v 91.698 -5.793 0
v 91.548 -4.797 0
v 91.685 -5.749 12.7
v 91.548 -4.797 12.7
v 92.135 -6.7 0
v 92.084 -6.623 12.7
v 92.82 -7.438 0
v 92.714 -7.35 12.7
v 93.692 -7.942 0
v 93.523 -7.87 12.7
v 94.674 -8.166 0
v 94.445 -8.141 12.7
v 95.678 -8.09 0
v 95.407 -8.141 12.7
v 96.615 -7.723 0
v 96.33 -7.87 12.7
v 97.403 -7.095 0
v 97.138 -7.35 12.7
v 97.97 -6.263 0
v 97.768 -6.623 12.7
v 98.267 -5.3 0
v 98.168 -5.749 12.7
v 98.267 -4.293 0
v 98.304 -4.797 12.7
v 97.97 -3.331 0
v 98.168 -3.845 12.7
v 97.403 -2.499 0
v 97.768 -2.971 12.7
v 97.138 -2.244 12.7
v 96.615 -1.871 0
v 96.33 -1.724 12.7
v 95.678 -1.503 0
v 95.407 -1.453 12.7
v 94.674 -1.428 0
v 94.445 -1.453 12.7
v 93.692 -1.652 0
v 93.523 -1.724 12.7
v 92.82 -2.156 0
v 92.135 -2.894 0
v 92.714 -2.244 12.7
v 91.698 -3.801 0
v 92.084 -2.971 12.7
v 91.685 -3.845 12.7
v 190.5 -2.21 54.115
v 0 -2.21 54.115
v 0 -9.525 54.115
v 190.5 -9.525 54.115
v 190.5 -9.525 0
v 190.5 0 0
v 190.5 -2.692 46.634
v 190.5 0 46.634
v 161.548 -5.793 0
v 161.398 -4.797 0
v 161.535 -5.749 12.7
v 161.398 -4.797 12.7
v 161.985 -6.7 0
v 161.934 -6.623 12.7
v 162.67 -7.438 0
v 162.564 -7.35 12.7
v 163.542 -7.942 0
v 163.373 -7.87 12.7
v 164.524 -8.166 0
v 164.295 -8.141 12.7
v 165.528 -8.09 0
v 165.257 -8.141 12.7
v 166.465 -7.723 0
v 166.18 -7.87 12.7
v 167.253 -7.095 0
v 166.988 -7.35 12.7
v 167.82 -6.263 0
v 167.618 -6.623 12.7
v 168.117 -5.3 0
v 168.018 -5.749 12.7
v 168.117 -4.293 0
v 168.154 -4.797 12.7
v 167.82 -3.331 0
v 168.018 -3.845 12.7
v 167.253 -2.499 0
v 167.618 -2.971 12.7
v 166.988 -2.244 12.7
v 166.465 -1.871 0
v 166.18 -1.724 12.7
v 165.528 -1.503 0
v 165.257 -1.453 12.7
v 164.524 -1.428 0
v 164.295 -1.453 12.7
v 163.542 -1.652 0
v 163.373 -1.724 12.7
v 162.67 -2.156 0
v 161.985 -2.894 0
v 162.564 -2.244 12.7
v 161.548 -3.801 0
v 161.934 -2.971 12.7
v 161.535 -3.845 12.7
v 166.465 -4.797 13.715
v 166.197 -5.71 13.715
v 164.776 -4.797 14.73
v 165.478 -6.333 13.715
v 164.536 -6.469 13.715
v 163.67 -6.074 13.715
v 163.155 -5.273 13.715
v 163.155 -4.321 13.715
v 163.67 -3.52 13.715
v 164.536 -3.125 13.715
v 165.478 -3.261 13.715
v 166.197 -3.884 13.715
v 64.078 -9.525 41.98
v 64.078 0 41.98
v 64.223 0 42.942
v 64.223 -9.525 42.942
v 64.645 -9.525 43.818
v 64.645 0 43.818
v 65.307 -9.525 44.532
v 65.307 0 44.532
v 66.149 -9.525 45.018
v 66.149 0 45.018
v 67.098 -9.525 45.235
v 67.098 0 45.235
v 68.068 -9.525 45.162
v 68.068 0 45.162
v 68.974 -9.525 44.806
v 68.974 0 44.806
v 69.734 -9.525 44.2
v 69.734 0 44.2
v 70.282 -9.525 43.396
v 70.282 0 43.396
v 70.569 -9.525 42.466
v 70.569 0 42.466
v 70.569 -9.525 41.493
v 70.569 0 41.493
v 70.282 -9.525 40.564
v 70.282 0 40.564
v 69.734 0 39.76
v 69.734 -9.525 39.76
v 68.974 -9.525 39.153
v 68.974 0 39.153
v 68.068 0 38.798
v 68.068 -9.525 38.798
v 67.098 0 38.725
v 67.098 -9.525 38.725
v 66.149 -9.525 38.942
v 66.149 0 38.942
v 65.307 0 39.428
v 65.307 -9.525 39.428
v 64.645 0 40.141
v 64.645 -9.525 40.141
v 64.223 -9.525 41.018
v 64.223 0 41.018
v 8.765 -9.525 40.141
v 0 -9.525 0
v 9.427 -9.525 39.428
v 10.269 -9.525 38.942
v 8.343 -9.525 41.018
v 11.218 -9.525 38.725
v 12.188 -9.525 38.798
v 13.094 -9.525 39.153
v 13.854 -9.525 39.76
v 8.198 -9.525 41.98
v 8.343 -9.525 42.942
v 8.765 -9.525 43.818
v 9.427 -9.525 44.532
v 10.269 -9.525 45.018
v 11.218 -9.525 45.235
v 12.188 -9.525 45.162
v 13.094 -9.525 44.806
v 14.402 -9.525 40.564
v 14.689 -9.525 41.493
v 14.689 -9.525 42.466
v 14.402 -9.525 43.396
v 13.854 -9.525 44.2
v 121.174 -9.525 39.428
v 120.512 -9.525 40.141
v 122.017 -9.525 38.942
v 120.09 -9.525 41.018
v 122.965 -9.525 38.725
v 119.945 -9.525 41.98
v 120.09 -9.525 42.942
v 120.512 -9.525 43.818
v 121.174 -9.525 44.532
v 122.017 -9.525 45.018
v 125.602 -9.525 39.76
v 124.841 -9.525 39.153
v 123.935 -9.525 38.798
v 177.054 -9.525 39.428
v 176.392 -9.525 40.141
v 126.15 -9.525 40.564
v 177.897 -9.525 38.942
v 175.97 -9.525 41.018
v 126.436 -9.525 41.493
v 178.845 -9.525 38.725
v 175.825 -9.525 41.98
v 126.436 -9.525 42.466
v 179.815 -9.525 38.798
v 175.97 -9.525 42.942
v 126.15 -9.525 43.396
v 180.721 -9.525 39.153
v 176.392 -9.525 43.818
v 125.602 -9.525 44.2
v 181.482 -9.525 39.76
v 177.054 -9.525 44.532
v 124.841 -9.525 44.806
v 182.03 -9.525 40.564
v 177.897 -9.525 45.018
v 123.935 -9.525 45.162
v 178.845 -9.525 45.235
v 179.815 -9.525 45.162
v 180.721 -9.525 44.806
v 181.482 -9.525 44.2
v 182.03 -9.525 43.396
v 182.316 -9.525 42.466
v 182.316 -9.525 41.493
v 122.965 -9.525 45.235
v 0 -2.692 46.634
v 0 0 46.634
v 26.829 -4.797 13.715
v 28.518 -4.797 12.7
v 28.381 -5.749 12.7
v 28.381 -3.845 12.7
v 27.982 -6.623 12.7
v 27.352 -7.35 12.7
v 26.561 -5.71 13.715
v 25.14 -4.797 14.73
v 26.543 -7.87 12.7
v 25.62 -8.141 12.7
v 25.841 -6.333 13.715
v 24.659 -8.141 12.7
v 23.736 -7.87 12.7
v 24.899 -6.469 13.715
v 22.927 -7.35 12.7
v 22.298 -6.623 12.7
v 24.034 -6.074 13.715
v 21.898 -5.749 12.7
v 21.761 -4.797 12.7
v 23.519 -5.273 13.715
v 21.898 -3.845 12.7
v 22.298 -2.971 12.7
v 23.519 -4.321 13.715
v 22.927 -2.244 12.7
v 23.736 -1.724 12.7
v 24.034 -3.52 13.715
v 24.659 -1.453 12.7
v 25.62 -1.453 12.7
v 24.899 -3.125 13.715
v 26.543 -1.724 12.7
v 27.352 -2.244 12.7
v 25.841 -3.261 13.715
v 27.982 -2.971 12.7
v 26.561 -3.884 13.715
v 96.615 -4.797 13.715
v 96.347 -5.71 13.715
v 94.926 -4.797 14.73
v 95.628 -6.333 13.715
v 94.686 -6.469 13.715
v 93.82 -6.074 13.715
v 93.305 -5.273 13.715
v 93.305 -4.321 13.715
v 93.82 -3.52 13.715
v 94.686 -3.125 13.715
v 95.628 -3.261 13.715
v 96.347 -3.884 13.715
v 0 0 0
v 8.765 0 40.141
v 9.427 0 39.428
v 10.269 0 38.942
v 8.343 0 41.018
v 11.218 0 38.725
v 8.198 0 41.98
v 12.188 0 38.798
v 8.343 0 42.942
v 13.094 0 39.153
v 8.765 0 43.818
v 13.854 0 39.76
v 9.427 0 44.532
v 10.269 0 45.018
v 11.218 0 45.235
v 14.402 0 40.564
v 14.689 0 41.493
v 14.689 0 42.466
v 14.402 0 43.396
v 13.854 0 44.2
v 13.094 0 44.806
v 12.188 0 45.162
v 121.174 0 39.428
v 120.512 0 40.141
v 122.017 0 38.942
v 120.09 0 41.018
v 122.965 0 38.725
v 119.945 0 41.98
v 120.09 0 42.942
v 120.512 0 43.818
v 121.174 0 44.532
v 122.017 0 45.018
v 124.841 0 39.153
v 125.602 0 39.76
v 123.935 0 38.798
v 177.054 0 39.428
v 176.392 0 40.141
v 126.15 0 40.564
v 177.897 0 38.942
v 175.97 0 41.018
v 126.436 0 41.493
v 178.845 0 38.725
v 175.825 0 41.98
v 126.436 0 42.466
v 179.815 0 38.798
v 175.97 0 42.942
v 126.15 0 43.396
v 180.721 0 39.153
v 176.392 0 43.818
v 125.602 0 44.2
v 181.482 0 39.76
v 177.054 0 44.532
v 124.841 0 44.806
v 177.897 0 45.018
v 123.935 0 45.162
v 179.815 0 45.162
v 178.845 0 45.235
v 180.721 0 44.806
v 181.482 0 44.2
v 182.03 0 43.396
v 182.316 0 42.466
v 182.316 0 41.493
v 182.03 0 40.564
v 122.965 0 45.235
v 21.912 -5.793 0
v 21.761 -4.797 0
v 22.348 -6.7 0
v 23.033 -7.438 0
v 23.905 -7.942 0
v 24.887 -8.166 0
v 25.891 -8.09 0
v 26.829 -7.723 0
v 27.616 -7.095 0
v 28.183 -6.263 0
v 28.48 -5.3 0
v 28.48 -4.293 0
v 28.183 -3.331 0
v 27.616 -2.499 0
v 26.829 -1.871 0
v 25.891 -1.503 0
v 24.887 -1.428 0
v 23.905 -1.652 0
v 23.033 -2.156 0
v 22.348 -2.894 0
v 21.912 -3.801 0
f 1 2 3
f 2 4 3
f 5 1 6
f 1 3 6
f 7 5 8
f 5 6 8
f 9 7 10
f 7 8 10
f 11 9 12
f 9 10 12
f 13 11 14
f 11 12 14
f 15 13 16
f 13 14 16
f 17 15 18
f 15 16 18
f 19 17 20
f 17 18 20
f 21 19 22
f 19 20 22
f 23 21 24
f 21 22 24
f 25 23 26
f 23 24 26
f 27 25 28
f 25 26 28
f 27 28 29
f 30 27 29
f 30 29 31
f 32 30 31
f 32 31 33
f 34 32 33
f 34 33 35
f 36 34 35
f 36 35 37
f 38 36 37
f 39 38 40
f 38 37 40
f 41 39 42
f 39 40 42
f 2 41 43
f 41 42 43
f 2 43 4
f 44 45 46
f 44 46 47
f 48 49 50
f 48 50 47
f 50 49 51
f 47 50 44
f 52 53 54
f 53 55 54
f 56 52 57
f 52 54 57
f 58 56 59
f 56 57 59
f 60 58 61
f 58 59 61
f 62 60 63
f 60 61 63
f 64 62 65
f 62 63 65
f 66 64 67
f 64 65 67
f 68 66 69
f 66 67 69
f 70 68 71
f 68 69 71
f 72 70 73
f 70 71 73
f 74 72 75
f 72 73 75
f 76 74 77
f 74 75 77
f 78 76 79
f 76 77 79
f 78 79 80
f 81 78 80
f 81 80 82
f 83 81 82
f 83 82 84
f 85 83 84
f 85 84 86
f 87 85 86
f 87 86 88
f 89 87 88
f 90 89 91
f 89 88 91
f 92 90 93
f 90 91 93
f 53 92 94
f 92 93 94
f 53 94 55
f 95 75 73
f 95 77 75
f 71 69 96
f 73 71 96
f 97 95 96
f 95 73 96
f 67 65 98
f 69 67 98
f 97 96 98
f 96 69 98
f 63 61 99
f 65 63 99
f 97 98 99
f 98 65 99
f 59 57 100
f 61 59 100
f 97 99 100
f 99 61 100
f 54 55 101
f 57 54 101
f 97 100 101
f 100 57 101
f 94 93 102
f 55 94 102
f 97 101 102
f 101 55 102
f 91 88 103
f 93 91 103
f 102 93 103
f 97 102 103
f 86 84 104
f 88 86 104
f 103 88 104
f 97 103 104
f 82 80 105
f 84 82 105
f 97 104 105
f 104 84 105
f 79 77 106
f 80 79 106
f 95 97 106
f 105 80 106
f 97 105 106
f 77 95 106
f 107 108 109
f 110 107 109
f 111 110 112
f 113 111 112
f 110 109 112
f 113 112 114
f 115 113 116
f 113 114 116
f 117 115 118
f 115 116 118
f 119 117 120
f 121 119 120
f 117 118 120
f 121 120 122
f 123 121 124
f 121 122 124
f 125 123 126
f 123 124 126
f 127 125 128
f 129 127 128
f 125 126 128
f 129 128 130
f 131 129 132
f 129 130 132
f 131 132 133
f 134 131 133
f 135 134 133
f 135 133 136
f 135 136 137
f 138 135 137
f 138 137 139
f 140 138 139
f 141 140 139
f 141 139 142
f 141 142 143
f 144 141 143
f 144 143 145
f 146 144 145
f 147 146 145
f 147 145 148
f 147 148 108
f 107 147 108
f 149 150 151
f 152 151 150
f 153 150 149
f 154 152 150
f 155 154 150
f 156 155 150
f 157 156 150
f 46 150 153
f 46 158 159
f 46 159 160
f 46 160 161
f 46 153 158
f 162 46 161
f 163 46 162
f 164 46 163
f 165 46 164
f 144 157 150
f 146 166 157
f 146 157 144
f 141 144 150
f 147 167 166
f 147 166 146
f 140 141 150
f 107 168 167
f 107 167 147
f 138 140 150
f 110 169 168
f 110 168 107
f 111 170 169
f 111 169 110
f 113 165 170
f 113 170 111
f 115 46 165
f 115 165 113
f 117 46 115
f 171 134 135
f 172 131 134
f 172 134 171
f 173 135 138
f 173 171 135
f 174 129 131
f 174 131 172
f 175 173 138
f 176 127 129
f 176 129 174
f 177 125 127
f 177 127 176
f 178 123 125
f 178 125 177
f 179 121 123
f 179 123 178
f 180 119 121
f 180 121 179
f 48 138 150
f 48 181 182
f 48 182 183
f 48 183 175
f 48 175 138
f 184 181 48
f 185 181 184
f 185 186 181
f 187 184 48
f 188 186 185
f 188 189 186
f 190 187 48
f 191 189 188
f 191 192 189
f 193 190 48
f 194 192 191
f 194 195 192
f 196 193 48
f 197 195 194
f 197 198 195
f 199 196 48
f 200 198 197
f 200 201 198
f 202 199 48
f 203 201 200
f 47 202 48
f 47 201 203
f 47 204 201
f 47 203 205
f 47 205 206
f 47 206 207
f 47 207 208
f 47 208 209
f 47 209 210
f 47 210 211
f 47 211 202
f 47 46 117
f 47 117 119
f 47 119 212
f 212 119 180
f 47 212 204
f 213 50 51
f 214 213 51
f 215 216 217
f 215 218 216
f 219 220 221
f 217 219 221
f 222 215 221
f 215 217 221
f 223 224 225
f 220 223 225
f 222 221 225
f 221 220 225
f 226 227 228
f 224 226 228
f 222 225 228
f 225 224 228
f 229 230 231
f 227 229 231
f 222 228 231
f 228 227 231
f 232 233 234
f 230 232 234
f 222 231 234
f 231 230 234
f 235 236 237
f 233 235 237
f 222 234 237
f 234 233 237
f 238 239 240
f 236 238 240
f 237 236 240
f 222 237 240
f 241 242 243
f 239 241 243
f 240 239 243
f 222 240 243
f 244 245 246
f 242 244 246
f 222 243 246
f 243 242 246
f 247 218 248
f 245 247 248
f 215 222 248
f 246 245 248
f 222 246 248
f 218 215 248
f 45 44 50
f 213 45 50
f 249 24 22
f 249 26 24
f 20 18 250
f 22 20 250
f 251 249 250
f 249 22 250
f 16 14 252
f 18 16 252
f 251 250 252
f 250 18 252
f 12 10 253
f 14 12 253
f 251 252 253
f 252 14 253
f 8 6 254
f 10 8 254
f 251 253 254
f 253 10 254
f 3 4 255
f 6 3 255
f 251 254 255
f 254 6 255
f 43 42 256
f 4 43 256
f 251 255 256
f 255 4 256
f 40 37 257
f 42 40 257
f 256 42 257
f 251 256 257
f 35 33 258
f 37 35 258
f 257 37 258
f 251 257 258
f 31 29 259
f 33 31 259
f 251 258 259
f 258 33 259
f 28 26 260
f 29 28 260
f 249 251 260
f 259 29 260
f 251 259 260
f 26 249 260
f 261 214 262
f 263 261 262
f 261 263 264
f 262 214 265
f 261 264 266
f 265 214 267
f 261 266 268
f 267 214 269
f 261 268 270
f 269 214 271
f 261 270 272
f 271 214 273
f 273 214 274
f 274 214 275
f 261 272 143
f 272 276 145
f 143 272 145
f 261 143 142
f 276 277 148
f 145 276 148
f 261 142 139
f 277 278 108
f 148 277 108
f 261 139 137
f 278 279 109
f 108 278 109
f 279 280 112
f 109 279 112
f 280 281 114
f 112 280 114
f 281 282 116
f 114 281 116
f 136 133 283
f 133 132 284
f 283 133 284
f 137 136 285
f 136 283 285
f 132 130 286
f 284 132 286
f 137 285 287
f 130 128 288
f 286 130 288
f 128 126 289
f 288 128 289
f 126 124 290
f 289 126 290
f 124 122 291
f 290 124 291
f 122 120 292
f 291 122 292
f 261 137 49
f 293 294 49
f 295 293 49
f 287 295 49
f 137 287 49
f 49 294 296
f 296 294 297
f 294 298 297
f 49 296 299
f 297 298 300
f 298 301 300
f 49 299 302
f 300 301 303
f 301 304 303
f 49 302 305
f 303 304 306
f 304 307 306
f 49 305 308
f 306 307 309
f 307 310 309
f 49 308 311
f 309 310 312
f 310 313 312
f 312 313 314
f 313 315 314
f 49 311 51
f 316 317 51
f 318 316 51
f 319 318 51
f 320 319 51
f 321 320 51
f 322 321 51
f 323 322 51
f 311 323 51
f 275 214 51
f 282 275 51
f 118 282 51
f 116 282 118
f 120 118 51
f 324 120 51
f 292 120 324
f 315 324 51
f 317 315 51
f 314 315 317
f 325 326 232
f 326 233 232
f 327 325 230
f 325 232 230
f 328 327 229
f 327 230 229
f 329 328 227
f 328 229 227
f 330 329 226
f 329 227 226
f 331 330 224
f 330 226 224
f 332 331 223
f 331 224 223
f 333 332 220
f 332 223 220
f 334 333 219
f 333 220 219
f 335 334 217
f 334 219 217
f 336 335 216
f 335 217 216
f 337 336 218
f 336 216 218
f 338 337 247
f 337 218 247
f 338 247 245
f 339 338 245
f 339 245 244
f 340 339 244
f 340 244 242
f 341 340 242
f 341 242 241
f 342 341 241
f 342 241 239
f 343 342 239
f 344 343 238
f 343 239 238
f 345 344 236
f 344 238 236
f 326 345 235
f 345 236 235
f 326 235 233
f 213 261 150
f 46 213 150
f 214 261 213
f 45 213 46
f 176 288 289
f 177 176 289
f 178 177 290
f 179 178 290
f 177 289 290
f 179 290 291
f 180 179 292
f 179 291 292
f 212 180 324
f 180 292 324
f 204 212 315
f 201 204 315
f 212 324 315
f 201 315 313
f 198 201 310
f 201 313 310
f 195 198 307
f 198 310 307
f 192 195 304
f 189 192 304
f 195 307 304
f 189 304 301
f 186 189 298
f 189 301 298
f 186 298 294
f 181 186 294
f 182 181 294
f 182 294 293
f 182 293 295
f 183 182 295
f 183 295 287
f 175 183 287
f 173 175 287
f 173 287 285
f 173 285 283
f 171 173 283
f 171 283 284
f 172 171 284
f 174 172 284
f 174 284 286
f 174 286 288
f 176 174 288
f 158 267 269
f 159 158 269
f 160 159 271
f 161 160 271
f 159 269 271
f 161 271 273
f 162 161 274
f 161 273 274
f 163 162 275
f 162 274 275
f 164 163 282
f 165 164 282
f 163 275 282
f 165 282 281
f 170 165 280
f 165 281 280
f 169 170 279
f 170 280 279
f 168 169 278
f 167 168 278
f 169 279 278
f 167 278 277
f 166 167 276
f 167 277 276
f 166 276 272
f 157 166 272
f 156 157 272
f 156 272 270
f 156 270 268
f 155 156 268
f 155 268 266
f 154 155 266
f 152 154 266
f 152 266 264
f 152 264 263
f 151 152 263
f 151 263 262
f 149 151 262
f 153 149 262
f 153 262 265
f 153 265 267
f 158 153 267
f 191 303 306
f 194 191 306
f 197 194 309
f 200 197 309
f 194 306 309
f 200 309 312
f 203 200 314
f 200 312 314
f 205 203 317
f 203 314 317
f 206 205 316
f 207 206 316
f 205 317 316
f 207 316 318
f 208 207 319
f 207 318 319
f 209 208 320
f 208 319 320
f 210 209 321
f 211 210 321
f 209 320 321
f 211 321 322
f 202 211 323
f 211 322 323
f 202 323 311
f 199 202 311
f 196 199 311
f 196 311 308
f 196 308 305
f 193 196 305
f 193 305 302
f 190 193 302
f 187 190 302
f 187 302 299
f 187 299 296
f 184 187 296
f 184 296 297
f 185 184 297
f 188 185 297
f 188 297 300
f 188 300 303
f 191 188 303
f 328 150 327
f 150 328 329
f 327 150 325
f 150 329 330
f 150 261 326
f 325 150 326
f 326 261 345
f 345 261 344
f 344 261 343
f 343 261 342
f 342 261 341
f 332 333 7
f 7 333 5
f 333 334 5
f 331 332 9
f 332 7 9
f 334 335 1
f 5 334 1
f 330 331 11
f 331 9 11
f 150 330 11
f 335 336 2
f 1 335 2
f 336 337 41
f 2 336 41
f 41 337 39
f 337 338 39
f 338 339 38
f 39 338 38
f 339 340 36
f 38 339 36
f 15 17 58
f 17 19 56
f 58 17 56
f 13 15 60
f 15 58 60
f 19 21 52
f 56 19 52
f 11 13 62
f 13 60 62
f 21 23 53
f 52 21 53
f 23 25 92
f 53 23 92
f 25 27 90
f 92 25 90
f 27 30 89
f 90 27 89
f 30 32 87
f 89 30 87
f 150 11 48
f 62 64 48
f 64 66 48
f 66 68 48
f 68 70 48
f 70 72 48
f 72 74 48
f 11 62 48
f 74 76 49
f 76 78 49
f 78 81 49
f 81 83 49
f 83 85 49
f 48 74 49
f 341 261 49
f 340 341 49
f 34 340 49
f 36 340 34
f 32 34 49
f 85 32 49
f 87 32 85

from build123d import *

# Parameters (mm, degrees)
F0_W     = 190.5
F0_H     = 54.1147
F1_DEPTH = 9.525
F3_D     = 6.5278
F5_DEPTH = 190.501
F7_D     = 6.7564
F7_DEPTH = 12.7
F7_TIP   = 2.0298273432


with BuildPart() as f1:
    # F0 (on Front) → F1 (new body)
    with BuildSketch(Plane.XZ):
        with Locations((95.25, 27.05735)):
            Rectangle(F0_W, F0_H)
    extrude(amount=F1_DEPTH)

    # F3 (through all)
    with Locations(Plane.XZ.offset(9.525)):
        with Locations((11.46175, 41.97985), (67.34175, 41.97985), (123.20905, 41.97985), (179.08905, 41.97985)):
            Hole(F3_D / 2)

    # F4 (on face) → F5 (cut, through all)
    with BuildSketch(Plane.YZ.offset(190.5)):
        Polygon((0, 54.1147), (-2.2098, 54.1147), (-2.6924, 46.6344), (0, 46.6344), align=None)
    extrude(amount=-F5_DEPTH, mode=Mode.SUBTRACT)

    # F7
    with Locations(Plane(origin=(0, 0, 0), x_dir=(1, 0, 0), z_dir=(0, 0, -1))):
        with Locations((25.13965, 4.7969794832), (94.92615, 4.7969794832), (164.77615, 4.7969794832)):
            Hole(F7_D / 2, depth=F7_DEPTH)
            with Locations((0, 0, -(F7_DEPTH + F7_TIP / 2))):  # 118° drill point
                Cone(0, F7_D / 2, F7_TIP, mode=Mode.SUBTRACT)


solid = f1.part
